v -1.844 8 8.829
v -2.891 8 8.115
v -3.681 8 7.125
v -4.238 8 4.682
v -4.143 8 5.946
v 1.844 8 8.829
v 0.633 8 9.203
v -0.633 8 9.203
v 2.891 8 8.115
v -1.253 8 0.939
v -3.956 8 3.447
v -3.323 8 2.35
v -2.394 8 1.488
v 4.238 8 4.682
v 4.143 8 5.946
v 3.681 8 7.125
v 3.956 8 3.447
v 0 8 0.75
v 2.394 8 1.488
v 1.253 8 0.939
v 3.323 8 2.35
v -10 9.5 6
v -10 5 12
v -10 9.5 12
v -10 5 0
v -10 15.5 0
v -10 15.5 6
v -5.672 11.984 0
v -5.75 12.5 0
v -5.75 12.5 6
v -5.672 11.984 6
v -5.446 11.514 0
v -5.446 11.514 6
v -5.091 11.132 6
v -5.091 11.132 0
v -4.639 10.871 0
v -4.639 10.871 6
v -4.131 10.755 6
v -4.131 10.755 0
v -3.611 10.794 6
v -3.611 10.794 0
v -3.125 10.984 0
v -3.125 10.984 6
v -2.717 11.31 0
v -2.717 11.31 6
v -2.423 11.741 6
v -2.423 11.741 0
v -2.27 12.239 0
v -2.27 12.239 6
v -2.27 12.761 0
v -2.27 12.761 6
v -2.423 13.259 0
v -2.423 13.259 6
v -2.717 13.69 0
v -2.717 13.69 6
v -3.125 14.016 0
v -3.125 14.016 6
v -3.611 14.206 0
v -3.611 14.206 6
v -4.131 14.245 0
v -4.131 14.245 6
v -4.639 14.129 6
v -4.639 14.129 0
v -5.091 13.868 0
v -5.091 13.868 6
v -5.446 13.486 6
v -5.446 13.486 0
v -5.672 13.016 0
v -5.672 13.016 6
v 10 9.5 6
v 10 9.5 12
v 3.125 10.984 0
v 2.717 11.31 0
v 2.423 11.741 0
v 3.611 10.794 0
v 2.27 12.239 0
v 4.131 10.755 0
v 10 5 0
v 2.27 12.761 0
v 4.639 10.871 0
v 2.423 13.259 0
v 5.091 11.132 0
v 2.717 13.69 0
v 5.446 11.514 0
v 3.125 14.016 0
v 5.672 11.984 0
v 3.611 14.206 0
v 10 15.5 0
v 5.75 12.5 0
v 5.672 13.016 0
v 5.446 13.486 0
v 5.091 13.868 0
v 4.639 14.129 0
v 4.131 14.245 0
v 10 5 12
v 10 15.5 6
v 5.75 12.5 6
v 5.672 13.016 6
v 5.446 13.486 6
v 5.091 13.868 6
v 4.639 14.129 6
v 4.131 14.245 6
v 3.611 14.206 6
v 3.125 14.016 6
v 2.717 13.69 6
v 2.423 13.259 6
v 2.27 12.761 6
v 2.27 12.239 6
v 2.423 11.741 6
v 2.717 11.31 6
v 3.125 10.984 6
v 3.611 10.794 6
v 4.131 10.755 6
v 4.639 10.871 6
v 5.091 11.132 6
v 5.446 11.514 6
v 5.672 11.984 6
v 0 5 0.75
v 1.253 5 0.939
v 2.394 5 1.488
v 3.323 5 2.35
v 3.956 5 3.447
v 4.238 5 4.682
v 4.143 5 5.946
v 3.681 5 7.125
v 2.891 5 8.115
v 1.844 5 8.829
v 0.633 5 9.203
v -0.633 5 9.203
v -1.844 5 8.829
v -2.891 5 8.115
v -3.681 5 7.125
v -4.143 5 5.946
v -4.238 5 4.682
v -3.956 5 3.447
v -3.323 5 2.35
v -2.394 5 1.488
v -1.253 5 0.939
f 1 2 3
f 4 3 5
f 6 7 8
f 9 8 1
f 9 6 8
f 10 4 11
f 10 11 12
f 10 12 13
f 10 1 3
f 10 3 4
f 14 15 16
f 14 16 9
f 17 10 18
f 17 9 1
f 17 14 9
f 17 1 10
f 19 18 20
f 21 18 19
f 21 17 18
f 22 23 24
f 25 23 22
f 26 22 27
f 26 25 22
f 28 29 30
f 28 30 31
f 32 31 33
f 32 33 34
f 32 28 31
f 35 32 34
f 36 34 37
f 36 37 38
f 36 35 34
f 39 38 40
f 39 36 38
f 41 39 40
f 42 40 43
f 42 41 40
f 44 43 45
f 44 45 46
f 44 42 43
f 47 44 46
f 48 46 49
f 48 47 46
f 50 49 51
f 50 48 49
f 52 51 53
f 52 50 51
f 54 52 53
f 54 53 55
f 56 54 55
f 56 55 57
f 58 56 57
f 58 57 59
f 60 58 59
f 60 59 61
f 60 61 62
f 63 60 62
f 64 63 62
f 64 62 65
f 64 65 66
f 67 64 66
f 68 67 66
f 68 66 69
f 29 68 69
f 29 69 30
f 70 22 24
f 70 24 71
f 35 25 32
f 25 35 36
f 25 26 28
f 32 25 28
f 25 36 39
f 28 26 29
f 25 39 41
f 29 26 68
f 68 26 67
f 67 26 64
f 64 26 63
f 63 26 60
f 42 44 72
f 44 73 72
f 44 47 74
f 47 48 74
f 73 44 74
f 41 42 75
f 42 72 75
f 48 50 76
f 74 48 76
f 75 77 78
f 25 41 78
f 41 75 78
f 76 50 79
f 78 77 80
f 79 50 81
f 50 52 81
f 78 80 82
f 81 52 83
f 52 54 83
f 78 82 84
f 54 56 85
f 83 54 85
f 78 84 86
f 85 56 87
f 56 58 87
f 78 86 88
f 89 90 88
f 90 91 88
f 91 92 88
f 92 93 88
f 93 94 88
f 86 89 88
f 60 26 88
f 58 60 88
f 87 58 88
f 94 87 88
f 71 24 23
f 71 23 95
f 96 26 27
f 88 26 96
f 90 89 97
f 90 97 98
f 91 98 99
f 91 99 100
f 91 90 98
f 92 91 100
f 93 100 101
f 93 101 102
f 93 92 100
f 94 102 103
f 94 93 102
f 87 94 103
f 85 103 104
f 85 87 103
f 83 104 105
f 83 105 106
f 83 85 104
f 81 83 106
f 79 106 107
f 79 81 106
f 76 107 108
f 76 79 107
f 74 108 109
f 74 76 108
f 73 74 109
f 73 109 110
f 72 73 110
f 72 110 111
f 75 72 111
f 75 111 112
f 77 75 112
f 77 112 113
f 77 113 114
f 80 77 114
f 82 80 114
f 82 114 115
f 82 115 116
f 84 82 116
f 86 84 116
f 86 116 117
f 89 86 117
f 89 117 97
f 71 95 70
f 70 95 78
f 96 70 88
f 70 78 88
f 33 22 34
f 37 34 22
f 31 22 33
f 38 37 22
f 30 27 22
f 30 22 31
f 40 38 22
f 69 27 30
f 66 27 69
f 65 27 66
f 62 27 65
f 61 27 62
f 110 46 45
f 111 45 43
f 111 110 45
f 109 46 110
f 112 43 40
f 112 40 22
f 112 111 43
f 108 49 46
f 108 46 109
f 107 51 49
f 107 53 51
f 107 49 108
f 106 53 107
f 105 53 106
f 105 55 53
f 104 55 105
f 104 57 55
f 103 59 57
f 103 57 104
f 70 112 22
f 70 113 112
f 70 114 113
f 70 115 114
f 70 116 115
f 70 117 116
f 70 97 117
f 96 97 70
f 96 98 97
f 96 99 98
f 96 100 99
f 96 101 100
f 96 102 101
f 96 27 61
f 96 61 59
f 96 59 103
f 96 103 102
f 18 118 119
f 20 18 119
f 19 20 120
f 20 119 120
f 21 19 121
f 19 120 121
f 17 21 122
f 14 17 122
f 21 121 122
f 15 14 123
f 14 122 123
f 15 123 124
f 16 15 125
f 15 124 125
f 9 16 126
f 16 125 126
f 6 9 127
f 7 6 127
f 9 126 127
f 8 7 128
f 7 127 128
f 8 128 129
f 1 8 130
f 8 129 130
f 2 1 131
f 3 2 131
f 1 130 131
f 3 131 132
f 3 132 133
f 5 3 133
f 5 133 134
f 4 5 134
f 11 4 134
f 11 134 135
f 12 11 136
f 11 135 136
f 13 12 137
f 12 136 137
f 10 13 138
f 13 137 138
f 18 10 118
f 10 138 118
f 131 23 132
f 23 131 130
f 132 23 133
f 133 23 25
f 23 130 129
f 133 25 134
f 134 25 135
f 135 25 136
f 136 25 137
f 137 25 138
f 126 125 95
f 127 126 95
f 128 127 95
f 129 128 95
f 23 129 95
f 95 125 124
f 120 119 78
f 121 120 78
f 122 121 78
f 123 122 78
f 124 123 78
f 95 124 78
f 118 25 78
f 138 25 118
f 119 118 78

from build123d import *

# Parameters (mm, degrees)
SKETCH1_W           = 20
SKETCH1_H           = 10.5
SKETCH1_R           = 1.75
BOSS_EXTRUDE1_DEPTH = 12
CUT_EXTRUDE1_START  = -6
SKETCH2_W           = 20
SKETCH2_H           = 6
SKETCH2_R           = 1.75
CUT_EXTRUDE1_DEPTH  = 6
SKETCH3_R           = 4.25
CUT_EXTRUDE3_DEPTH  = 3


with BuildPart() as part:
    # Sketch1 → Boss-Extrude1 (new body)
    with BuildSketch(Plane.XY):
        with Locations((0, 10.25)):
            Rectangle(SKETCH1_W, SKETCH1_H)
        with Locations((4, 12.5)):
            Circle(SKETCH1_R, mode=Mode.SUBTRACT)
        with Locations(Location((-4, 12.5, 0), (0, 0, 180))):
            Circle(SKETCH1_R, mode=Mode.SUBTRACT)
    extrude(amount=BOSS_EXTRUDE1_DEPTH)

    # Sketch2 → Cut-Extrude1 (cut)
    with BuildSketch(Plane.XY.offset(12).offset(CUT_EXTRUDE1_START)):
        with Locations((0, 12.5)):
            Rectangle(SKETCH2_W, SKETCH2_H)
        with Locations(Location((-4, 12.5, 0), (0, 0, 180))):
            Circle(SKETCH2_R, mode=Mode.SUBTRACT)
        with Locations((4, 12.5)):
            Circle(SKETCH2_R, mode=Mode.SUBTRACT)
    extrude(amount=CUT_EXTRUDE1_DEPTH, mode=Mode.SUBTRACT)

    # Sketch3 → Cut-Extrude3 (cut)
    with BuildSketch(Plane.XZ.offset(-5)):
        with Locations(Location((0, 5, 0), (0, 0, 270))):
            Circle(SKETCH3_R)
    extrude(amount=-CUT_EXTRUDE3_DEPTH, mode=Mode.SUBTRACT)


solid = part.part
